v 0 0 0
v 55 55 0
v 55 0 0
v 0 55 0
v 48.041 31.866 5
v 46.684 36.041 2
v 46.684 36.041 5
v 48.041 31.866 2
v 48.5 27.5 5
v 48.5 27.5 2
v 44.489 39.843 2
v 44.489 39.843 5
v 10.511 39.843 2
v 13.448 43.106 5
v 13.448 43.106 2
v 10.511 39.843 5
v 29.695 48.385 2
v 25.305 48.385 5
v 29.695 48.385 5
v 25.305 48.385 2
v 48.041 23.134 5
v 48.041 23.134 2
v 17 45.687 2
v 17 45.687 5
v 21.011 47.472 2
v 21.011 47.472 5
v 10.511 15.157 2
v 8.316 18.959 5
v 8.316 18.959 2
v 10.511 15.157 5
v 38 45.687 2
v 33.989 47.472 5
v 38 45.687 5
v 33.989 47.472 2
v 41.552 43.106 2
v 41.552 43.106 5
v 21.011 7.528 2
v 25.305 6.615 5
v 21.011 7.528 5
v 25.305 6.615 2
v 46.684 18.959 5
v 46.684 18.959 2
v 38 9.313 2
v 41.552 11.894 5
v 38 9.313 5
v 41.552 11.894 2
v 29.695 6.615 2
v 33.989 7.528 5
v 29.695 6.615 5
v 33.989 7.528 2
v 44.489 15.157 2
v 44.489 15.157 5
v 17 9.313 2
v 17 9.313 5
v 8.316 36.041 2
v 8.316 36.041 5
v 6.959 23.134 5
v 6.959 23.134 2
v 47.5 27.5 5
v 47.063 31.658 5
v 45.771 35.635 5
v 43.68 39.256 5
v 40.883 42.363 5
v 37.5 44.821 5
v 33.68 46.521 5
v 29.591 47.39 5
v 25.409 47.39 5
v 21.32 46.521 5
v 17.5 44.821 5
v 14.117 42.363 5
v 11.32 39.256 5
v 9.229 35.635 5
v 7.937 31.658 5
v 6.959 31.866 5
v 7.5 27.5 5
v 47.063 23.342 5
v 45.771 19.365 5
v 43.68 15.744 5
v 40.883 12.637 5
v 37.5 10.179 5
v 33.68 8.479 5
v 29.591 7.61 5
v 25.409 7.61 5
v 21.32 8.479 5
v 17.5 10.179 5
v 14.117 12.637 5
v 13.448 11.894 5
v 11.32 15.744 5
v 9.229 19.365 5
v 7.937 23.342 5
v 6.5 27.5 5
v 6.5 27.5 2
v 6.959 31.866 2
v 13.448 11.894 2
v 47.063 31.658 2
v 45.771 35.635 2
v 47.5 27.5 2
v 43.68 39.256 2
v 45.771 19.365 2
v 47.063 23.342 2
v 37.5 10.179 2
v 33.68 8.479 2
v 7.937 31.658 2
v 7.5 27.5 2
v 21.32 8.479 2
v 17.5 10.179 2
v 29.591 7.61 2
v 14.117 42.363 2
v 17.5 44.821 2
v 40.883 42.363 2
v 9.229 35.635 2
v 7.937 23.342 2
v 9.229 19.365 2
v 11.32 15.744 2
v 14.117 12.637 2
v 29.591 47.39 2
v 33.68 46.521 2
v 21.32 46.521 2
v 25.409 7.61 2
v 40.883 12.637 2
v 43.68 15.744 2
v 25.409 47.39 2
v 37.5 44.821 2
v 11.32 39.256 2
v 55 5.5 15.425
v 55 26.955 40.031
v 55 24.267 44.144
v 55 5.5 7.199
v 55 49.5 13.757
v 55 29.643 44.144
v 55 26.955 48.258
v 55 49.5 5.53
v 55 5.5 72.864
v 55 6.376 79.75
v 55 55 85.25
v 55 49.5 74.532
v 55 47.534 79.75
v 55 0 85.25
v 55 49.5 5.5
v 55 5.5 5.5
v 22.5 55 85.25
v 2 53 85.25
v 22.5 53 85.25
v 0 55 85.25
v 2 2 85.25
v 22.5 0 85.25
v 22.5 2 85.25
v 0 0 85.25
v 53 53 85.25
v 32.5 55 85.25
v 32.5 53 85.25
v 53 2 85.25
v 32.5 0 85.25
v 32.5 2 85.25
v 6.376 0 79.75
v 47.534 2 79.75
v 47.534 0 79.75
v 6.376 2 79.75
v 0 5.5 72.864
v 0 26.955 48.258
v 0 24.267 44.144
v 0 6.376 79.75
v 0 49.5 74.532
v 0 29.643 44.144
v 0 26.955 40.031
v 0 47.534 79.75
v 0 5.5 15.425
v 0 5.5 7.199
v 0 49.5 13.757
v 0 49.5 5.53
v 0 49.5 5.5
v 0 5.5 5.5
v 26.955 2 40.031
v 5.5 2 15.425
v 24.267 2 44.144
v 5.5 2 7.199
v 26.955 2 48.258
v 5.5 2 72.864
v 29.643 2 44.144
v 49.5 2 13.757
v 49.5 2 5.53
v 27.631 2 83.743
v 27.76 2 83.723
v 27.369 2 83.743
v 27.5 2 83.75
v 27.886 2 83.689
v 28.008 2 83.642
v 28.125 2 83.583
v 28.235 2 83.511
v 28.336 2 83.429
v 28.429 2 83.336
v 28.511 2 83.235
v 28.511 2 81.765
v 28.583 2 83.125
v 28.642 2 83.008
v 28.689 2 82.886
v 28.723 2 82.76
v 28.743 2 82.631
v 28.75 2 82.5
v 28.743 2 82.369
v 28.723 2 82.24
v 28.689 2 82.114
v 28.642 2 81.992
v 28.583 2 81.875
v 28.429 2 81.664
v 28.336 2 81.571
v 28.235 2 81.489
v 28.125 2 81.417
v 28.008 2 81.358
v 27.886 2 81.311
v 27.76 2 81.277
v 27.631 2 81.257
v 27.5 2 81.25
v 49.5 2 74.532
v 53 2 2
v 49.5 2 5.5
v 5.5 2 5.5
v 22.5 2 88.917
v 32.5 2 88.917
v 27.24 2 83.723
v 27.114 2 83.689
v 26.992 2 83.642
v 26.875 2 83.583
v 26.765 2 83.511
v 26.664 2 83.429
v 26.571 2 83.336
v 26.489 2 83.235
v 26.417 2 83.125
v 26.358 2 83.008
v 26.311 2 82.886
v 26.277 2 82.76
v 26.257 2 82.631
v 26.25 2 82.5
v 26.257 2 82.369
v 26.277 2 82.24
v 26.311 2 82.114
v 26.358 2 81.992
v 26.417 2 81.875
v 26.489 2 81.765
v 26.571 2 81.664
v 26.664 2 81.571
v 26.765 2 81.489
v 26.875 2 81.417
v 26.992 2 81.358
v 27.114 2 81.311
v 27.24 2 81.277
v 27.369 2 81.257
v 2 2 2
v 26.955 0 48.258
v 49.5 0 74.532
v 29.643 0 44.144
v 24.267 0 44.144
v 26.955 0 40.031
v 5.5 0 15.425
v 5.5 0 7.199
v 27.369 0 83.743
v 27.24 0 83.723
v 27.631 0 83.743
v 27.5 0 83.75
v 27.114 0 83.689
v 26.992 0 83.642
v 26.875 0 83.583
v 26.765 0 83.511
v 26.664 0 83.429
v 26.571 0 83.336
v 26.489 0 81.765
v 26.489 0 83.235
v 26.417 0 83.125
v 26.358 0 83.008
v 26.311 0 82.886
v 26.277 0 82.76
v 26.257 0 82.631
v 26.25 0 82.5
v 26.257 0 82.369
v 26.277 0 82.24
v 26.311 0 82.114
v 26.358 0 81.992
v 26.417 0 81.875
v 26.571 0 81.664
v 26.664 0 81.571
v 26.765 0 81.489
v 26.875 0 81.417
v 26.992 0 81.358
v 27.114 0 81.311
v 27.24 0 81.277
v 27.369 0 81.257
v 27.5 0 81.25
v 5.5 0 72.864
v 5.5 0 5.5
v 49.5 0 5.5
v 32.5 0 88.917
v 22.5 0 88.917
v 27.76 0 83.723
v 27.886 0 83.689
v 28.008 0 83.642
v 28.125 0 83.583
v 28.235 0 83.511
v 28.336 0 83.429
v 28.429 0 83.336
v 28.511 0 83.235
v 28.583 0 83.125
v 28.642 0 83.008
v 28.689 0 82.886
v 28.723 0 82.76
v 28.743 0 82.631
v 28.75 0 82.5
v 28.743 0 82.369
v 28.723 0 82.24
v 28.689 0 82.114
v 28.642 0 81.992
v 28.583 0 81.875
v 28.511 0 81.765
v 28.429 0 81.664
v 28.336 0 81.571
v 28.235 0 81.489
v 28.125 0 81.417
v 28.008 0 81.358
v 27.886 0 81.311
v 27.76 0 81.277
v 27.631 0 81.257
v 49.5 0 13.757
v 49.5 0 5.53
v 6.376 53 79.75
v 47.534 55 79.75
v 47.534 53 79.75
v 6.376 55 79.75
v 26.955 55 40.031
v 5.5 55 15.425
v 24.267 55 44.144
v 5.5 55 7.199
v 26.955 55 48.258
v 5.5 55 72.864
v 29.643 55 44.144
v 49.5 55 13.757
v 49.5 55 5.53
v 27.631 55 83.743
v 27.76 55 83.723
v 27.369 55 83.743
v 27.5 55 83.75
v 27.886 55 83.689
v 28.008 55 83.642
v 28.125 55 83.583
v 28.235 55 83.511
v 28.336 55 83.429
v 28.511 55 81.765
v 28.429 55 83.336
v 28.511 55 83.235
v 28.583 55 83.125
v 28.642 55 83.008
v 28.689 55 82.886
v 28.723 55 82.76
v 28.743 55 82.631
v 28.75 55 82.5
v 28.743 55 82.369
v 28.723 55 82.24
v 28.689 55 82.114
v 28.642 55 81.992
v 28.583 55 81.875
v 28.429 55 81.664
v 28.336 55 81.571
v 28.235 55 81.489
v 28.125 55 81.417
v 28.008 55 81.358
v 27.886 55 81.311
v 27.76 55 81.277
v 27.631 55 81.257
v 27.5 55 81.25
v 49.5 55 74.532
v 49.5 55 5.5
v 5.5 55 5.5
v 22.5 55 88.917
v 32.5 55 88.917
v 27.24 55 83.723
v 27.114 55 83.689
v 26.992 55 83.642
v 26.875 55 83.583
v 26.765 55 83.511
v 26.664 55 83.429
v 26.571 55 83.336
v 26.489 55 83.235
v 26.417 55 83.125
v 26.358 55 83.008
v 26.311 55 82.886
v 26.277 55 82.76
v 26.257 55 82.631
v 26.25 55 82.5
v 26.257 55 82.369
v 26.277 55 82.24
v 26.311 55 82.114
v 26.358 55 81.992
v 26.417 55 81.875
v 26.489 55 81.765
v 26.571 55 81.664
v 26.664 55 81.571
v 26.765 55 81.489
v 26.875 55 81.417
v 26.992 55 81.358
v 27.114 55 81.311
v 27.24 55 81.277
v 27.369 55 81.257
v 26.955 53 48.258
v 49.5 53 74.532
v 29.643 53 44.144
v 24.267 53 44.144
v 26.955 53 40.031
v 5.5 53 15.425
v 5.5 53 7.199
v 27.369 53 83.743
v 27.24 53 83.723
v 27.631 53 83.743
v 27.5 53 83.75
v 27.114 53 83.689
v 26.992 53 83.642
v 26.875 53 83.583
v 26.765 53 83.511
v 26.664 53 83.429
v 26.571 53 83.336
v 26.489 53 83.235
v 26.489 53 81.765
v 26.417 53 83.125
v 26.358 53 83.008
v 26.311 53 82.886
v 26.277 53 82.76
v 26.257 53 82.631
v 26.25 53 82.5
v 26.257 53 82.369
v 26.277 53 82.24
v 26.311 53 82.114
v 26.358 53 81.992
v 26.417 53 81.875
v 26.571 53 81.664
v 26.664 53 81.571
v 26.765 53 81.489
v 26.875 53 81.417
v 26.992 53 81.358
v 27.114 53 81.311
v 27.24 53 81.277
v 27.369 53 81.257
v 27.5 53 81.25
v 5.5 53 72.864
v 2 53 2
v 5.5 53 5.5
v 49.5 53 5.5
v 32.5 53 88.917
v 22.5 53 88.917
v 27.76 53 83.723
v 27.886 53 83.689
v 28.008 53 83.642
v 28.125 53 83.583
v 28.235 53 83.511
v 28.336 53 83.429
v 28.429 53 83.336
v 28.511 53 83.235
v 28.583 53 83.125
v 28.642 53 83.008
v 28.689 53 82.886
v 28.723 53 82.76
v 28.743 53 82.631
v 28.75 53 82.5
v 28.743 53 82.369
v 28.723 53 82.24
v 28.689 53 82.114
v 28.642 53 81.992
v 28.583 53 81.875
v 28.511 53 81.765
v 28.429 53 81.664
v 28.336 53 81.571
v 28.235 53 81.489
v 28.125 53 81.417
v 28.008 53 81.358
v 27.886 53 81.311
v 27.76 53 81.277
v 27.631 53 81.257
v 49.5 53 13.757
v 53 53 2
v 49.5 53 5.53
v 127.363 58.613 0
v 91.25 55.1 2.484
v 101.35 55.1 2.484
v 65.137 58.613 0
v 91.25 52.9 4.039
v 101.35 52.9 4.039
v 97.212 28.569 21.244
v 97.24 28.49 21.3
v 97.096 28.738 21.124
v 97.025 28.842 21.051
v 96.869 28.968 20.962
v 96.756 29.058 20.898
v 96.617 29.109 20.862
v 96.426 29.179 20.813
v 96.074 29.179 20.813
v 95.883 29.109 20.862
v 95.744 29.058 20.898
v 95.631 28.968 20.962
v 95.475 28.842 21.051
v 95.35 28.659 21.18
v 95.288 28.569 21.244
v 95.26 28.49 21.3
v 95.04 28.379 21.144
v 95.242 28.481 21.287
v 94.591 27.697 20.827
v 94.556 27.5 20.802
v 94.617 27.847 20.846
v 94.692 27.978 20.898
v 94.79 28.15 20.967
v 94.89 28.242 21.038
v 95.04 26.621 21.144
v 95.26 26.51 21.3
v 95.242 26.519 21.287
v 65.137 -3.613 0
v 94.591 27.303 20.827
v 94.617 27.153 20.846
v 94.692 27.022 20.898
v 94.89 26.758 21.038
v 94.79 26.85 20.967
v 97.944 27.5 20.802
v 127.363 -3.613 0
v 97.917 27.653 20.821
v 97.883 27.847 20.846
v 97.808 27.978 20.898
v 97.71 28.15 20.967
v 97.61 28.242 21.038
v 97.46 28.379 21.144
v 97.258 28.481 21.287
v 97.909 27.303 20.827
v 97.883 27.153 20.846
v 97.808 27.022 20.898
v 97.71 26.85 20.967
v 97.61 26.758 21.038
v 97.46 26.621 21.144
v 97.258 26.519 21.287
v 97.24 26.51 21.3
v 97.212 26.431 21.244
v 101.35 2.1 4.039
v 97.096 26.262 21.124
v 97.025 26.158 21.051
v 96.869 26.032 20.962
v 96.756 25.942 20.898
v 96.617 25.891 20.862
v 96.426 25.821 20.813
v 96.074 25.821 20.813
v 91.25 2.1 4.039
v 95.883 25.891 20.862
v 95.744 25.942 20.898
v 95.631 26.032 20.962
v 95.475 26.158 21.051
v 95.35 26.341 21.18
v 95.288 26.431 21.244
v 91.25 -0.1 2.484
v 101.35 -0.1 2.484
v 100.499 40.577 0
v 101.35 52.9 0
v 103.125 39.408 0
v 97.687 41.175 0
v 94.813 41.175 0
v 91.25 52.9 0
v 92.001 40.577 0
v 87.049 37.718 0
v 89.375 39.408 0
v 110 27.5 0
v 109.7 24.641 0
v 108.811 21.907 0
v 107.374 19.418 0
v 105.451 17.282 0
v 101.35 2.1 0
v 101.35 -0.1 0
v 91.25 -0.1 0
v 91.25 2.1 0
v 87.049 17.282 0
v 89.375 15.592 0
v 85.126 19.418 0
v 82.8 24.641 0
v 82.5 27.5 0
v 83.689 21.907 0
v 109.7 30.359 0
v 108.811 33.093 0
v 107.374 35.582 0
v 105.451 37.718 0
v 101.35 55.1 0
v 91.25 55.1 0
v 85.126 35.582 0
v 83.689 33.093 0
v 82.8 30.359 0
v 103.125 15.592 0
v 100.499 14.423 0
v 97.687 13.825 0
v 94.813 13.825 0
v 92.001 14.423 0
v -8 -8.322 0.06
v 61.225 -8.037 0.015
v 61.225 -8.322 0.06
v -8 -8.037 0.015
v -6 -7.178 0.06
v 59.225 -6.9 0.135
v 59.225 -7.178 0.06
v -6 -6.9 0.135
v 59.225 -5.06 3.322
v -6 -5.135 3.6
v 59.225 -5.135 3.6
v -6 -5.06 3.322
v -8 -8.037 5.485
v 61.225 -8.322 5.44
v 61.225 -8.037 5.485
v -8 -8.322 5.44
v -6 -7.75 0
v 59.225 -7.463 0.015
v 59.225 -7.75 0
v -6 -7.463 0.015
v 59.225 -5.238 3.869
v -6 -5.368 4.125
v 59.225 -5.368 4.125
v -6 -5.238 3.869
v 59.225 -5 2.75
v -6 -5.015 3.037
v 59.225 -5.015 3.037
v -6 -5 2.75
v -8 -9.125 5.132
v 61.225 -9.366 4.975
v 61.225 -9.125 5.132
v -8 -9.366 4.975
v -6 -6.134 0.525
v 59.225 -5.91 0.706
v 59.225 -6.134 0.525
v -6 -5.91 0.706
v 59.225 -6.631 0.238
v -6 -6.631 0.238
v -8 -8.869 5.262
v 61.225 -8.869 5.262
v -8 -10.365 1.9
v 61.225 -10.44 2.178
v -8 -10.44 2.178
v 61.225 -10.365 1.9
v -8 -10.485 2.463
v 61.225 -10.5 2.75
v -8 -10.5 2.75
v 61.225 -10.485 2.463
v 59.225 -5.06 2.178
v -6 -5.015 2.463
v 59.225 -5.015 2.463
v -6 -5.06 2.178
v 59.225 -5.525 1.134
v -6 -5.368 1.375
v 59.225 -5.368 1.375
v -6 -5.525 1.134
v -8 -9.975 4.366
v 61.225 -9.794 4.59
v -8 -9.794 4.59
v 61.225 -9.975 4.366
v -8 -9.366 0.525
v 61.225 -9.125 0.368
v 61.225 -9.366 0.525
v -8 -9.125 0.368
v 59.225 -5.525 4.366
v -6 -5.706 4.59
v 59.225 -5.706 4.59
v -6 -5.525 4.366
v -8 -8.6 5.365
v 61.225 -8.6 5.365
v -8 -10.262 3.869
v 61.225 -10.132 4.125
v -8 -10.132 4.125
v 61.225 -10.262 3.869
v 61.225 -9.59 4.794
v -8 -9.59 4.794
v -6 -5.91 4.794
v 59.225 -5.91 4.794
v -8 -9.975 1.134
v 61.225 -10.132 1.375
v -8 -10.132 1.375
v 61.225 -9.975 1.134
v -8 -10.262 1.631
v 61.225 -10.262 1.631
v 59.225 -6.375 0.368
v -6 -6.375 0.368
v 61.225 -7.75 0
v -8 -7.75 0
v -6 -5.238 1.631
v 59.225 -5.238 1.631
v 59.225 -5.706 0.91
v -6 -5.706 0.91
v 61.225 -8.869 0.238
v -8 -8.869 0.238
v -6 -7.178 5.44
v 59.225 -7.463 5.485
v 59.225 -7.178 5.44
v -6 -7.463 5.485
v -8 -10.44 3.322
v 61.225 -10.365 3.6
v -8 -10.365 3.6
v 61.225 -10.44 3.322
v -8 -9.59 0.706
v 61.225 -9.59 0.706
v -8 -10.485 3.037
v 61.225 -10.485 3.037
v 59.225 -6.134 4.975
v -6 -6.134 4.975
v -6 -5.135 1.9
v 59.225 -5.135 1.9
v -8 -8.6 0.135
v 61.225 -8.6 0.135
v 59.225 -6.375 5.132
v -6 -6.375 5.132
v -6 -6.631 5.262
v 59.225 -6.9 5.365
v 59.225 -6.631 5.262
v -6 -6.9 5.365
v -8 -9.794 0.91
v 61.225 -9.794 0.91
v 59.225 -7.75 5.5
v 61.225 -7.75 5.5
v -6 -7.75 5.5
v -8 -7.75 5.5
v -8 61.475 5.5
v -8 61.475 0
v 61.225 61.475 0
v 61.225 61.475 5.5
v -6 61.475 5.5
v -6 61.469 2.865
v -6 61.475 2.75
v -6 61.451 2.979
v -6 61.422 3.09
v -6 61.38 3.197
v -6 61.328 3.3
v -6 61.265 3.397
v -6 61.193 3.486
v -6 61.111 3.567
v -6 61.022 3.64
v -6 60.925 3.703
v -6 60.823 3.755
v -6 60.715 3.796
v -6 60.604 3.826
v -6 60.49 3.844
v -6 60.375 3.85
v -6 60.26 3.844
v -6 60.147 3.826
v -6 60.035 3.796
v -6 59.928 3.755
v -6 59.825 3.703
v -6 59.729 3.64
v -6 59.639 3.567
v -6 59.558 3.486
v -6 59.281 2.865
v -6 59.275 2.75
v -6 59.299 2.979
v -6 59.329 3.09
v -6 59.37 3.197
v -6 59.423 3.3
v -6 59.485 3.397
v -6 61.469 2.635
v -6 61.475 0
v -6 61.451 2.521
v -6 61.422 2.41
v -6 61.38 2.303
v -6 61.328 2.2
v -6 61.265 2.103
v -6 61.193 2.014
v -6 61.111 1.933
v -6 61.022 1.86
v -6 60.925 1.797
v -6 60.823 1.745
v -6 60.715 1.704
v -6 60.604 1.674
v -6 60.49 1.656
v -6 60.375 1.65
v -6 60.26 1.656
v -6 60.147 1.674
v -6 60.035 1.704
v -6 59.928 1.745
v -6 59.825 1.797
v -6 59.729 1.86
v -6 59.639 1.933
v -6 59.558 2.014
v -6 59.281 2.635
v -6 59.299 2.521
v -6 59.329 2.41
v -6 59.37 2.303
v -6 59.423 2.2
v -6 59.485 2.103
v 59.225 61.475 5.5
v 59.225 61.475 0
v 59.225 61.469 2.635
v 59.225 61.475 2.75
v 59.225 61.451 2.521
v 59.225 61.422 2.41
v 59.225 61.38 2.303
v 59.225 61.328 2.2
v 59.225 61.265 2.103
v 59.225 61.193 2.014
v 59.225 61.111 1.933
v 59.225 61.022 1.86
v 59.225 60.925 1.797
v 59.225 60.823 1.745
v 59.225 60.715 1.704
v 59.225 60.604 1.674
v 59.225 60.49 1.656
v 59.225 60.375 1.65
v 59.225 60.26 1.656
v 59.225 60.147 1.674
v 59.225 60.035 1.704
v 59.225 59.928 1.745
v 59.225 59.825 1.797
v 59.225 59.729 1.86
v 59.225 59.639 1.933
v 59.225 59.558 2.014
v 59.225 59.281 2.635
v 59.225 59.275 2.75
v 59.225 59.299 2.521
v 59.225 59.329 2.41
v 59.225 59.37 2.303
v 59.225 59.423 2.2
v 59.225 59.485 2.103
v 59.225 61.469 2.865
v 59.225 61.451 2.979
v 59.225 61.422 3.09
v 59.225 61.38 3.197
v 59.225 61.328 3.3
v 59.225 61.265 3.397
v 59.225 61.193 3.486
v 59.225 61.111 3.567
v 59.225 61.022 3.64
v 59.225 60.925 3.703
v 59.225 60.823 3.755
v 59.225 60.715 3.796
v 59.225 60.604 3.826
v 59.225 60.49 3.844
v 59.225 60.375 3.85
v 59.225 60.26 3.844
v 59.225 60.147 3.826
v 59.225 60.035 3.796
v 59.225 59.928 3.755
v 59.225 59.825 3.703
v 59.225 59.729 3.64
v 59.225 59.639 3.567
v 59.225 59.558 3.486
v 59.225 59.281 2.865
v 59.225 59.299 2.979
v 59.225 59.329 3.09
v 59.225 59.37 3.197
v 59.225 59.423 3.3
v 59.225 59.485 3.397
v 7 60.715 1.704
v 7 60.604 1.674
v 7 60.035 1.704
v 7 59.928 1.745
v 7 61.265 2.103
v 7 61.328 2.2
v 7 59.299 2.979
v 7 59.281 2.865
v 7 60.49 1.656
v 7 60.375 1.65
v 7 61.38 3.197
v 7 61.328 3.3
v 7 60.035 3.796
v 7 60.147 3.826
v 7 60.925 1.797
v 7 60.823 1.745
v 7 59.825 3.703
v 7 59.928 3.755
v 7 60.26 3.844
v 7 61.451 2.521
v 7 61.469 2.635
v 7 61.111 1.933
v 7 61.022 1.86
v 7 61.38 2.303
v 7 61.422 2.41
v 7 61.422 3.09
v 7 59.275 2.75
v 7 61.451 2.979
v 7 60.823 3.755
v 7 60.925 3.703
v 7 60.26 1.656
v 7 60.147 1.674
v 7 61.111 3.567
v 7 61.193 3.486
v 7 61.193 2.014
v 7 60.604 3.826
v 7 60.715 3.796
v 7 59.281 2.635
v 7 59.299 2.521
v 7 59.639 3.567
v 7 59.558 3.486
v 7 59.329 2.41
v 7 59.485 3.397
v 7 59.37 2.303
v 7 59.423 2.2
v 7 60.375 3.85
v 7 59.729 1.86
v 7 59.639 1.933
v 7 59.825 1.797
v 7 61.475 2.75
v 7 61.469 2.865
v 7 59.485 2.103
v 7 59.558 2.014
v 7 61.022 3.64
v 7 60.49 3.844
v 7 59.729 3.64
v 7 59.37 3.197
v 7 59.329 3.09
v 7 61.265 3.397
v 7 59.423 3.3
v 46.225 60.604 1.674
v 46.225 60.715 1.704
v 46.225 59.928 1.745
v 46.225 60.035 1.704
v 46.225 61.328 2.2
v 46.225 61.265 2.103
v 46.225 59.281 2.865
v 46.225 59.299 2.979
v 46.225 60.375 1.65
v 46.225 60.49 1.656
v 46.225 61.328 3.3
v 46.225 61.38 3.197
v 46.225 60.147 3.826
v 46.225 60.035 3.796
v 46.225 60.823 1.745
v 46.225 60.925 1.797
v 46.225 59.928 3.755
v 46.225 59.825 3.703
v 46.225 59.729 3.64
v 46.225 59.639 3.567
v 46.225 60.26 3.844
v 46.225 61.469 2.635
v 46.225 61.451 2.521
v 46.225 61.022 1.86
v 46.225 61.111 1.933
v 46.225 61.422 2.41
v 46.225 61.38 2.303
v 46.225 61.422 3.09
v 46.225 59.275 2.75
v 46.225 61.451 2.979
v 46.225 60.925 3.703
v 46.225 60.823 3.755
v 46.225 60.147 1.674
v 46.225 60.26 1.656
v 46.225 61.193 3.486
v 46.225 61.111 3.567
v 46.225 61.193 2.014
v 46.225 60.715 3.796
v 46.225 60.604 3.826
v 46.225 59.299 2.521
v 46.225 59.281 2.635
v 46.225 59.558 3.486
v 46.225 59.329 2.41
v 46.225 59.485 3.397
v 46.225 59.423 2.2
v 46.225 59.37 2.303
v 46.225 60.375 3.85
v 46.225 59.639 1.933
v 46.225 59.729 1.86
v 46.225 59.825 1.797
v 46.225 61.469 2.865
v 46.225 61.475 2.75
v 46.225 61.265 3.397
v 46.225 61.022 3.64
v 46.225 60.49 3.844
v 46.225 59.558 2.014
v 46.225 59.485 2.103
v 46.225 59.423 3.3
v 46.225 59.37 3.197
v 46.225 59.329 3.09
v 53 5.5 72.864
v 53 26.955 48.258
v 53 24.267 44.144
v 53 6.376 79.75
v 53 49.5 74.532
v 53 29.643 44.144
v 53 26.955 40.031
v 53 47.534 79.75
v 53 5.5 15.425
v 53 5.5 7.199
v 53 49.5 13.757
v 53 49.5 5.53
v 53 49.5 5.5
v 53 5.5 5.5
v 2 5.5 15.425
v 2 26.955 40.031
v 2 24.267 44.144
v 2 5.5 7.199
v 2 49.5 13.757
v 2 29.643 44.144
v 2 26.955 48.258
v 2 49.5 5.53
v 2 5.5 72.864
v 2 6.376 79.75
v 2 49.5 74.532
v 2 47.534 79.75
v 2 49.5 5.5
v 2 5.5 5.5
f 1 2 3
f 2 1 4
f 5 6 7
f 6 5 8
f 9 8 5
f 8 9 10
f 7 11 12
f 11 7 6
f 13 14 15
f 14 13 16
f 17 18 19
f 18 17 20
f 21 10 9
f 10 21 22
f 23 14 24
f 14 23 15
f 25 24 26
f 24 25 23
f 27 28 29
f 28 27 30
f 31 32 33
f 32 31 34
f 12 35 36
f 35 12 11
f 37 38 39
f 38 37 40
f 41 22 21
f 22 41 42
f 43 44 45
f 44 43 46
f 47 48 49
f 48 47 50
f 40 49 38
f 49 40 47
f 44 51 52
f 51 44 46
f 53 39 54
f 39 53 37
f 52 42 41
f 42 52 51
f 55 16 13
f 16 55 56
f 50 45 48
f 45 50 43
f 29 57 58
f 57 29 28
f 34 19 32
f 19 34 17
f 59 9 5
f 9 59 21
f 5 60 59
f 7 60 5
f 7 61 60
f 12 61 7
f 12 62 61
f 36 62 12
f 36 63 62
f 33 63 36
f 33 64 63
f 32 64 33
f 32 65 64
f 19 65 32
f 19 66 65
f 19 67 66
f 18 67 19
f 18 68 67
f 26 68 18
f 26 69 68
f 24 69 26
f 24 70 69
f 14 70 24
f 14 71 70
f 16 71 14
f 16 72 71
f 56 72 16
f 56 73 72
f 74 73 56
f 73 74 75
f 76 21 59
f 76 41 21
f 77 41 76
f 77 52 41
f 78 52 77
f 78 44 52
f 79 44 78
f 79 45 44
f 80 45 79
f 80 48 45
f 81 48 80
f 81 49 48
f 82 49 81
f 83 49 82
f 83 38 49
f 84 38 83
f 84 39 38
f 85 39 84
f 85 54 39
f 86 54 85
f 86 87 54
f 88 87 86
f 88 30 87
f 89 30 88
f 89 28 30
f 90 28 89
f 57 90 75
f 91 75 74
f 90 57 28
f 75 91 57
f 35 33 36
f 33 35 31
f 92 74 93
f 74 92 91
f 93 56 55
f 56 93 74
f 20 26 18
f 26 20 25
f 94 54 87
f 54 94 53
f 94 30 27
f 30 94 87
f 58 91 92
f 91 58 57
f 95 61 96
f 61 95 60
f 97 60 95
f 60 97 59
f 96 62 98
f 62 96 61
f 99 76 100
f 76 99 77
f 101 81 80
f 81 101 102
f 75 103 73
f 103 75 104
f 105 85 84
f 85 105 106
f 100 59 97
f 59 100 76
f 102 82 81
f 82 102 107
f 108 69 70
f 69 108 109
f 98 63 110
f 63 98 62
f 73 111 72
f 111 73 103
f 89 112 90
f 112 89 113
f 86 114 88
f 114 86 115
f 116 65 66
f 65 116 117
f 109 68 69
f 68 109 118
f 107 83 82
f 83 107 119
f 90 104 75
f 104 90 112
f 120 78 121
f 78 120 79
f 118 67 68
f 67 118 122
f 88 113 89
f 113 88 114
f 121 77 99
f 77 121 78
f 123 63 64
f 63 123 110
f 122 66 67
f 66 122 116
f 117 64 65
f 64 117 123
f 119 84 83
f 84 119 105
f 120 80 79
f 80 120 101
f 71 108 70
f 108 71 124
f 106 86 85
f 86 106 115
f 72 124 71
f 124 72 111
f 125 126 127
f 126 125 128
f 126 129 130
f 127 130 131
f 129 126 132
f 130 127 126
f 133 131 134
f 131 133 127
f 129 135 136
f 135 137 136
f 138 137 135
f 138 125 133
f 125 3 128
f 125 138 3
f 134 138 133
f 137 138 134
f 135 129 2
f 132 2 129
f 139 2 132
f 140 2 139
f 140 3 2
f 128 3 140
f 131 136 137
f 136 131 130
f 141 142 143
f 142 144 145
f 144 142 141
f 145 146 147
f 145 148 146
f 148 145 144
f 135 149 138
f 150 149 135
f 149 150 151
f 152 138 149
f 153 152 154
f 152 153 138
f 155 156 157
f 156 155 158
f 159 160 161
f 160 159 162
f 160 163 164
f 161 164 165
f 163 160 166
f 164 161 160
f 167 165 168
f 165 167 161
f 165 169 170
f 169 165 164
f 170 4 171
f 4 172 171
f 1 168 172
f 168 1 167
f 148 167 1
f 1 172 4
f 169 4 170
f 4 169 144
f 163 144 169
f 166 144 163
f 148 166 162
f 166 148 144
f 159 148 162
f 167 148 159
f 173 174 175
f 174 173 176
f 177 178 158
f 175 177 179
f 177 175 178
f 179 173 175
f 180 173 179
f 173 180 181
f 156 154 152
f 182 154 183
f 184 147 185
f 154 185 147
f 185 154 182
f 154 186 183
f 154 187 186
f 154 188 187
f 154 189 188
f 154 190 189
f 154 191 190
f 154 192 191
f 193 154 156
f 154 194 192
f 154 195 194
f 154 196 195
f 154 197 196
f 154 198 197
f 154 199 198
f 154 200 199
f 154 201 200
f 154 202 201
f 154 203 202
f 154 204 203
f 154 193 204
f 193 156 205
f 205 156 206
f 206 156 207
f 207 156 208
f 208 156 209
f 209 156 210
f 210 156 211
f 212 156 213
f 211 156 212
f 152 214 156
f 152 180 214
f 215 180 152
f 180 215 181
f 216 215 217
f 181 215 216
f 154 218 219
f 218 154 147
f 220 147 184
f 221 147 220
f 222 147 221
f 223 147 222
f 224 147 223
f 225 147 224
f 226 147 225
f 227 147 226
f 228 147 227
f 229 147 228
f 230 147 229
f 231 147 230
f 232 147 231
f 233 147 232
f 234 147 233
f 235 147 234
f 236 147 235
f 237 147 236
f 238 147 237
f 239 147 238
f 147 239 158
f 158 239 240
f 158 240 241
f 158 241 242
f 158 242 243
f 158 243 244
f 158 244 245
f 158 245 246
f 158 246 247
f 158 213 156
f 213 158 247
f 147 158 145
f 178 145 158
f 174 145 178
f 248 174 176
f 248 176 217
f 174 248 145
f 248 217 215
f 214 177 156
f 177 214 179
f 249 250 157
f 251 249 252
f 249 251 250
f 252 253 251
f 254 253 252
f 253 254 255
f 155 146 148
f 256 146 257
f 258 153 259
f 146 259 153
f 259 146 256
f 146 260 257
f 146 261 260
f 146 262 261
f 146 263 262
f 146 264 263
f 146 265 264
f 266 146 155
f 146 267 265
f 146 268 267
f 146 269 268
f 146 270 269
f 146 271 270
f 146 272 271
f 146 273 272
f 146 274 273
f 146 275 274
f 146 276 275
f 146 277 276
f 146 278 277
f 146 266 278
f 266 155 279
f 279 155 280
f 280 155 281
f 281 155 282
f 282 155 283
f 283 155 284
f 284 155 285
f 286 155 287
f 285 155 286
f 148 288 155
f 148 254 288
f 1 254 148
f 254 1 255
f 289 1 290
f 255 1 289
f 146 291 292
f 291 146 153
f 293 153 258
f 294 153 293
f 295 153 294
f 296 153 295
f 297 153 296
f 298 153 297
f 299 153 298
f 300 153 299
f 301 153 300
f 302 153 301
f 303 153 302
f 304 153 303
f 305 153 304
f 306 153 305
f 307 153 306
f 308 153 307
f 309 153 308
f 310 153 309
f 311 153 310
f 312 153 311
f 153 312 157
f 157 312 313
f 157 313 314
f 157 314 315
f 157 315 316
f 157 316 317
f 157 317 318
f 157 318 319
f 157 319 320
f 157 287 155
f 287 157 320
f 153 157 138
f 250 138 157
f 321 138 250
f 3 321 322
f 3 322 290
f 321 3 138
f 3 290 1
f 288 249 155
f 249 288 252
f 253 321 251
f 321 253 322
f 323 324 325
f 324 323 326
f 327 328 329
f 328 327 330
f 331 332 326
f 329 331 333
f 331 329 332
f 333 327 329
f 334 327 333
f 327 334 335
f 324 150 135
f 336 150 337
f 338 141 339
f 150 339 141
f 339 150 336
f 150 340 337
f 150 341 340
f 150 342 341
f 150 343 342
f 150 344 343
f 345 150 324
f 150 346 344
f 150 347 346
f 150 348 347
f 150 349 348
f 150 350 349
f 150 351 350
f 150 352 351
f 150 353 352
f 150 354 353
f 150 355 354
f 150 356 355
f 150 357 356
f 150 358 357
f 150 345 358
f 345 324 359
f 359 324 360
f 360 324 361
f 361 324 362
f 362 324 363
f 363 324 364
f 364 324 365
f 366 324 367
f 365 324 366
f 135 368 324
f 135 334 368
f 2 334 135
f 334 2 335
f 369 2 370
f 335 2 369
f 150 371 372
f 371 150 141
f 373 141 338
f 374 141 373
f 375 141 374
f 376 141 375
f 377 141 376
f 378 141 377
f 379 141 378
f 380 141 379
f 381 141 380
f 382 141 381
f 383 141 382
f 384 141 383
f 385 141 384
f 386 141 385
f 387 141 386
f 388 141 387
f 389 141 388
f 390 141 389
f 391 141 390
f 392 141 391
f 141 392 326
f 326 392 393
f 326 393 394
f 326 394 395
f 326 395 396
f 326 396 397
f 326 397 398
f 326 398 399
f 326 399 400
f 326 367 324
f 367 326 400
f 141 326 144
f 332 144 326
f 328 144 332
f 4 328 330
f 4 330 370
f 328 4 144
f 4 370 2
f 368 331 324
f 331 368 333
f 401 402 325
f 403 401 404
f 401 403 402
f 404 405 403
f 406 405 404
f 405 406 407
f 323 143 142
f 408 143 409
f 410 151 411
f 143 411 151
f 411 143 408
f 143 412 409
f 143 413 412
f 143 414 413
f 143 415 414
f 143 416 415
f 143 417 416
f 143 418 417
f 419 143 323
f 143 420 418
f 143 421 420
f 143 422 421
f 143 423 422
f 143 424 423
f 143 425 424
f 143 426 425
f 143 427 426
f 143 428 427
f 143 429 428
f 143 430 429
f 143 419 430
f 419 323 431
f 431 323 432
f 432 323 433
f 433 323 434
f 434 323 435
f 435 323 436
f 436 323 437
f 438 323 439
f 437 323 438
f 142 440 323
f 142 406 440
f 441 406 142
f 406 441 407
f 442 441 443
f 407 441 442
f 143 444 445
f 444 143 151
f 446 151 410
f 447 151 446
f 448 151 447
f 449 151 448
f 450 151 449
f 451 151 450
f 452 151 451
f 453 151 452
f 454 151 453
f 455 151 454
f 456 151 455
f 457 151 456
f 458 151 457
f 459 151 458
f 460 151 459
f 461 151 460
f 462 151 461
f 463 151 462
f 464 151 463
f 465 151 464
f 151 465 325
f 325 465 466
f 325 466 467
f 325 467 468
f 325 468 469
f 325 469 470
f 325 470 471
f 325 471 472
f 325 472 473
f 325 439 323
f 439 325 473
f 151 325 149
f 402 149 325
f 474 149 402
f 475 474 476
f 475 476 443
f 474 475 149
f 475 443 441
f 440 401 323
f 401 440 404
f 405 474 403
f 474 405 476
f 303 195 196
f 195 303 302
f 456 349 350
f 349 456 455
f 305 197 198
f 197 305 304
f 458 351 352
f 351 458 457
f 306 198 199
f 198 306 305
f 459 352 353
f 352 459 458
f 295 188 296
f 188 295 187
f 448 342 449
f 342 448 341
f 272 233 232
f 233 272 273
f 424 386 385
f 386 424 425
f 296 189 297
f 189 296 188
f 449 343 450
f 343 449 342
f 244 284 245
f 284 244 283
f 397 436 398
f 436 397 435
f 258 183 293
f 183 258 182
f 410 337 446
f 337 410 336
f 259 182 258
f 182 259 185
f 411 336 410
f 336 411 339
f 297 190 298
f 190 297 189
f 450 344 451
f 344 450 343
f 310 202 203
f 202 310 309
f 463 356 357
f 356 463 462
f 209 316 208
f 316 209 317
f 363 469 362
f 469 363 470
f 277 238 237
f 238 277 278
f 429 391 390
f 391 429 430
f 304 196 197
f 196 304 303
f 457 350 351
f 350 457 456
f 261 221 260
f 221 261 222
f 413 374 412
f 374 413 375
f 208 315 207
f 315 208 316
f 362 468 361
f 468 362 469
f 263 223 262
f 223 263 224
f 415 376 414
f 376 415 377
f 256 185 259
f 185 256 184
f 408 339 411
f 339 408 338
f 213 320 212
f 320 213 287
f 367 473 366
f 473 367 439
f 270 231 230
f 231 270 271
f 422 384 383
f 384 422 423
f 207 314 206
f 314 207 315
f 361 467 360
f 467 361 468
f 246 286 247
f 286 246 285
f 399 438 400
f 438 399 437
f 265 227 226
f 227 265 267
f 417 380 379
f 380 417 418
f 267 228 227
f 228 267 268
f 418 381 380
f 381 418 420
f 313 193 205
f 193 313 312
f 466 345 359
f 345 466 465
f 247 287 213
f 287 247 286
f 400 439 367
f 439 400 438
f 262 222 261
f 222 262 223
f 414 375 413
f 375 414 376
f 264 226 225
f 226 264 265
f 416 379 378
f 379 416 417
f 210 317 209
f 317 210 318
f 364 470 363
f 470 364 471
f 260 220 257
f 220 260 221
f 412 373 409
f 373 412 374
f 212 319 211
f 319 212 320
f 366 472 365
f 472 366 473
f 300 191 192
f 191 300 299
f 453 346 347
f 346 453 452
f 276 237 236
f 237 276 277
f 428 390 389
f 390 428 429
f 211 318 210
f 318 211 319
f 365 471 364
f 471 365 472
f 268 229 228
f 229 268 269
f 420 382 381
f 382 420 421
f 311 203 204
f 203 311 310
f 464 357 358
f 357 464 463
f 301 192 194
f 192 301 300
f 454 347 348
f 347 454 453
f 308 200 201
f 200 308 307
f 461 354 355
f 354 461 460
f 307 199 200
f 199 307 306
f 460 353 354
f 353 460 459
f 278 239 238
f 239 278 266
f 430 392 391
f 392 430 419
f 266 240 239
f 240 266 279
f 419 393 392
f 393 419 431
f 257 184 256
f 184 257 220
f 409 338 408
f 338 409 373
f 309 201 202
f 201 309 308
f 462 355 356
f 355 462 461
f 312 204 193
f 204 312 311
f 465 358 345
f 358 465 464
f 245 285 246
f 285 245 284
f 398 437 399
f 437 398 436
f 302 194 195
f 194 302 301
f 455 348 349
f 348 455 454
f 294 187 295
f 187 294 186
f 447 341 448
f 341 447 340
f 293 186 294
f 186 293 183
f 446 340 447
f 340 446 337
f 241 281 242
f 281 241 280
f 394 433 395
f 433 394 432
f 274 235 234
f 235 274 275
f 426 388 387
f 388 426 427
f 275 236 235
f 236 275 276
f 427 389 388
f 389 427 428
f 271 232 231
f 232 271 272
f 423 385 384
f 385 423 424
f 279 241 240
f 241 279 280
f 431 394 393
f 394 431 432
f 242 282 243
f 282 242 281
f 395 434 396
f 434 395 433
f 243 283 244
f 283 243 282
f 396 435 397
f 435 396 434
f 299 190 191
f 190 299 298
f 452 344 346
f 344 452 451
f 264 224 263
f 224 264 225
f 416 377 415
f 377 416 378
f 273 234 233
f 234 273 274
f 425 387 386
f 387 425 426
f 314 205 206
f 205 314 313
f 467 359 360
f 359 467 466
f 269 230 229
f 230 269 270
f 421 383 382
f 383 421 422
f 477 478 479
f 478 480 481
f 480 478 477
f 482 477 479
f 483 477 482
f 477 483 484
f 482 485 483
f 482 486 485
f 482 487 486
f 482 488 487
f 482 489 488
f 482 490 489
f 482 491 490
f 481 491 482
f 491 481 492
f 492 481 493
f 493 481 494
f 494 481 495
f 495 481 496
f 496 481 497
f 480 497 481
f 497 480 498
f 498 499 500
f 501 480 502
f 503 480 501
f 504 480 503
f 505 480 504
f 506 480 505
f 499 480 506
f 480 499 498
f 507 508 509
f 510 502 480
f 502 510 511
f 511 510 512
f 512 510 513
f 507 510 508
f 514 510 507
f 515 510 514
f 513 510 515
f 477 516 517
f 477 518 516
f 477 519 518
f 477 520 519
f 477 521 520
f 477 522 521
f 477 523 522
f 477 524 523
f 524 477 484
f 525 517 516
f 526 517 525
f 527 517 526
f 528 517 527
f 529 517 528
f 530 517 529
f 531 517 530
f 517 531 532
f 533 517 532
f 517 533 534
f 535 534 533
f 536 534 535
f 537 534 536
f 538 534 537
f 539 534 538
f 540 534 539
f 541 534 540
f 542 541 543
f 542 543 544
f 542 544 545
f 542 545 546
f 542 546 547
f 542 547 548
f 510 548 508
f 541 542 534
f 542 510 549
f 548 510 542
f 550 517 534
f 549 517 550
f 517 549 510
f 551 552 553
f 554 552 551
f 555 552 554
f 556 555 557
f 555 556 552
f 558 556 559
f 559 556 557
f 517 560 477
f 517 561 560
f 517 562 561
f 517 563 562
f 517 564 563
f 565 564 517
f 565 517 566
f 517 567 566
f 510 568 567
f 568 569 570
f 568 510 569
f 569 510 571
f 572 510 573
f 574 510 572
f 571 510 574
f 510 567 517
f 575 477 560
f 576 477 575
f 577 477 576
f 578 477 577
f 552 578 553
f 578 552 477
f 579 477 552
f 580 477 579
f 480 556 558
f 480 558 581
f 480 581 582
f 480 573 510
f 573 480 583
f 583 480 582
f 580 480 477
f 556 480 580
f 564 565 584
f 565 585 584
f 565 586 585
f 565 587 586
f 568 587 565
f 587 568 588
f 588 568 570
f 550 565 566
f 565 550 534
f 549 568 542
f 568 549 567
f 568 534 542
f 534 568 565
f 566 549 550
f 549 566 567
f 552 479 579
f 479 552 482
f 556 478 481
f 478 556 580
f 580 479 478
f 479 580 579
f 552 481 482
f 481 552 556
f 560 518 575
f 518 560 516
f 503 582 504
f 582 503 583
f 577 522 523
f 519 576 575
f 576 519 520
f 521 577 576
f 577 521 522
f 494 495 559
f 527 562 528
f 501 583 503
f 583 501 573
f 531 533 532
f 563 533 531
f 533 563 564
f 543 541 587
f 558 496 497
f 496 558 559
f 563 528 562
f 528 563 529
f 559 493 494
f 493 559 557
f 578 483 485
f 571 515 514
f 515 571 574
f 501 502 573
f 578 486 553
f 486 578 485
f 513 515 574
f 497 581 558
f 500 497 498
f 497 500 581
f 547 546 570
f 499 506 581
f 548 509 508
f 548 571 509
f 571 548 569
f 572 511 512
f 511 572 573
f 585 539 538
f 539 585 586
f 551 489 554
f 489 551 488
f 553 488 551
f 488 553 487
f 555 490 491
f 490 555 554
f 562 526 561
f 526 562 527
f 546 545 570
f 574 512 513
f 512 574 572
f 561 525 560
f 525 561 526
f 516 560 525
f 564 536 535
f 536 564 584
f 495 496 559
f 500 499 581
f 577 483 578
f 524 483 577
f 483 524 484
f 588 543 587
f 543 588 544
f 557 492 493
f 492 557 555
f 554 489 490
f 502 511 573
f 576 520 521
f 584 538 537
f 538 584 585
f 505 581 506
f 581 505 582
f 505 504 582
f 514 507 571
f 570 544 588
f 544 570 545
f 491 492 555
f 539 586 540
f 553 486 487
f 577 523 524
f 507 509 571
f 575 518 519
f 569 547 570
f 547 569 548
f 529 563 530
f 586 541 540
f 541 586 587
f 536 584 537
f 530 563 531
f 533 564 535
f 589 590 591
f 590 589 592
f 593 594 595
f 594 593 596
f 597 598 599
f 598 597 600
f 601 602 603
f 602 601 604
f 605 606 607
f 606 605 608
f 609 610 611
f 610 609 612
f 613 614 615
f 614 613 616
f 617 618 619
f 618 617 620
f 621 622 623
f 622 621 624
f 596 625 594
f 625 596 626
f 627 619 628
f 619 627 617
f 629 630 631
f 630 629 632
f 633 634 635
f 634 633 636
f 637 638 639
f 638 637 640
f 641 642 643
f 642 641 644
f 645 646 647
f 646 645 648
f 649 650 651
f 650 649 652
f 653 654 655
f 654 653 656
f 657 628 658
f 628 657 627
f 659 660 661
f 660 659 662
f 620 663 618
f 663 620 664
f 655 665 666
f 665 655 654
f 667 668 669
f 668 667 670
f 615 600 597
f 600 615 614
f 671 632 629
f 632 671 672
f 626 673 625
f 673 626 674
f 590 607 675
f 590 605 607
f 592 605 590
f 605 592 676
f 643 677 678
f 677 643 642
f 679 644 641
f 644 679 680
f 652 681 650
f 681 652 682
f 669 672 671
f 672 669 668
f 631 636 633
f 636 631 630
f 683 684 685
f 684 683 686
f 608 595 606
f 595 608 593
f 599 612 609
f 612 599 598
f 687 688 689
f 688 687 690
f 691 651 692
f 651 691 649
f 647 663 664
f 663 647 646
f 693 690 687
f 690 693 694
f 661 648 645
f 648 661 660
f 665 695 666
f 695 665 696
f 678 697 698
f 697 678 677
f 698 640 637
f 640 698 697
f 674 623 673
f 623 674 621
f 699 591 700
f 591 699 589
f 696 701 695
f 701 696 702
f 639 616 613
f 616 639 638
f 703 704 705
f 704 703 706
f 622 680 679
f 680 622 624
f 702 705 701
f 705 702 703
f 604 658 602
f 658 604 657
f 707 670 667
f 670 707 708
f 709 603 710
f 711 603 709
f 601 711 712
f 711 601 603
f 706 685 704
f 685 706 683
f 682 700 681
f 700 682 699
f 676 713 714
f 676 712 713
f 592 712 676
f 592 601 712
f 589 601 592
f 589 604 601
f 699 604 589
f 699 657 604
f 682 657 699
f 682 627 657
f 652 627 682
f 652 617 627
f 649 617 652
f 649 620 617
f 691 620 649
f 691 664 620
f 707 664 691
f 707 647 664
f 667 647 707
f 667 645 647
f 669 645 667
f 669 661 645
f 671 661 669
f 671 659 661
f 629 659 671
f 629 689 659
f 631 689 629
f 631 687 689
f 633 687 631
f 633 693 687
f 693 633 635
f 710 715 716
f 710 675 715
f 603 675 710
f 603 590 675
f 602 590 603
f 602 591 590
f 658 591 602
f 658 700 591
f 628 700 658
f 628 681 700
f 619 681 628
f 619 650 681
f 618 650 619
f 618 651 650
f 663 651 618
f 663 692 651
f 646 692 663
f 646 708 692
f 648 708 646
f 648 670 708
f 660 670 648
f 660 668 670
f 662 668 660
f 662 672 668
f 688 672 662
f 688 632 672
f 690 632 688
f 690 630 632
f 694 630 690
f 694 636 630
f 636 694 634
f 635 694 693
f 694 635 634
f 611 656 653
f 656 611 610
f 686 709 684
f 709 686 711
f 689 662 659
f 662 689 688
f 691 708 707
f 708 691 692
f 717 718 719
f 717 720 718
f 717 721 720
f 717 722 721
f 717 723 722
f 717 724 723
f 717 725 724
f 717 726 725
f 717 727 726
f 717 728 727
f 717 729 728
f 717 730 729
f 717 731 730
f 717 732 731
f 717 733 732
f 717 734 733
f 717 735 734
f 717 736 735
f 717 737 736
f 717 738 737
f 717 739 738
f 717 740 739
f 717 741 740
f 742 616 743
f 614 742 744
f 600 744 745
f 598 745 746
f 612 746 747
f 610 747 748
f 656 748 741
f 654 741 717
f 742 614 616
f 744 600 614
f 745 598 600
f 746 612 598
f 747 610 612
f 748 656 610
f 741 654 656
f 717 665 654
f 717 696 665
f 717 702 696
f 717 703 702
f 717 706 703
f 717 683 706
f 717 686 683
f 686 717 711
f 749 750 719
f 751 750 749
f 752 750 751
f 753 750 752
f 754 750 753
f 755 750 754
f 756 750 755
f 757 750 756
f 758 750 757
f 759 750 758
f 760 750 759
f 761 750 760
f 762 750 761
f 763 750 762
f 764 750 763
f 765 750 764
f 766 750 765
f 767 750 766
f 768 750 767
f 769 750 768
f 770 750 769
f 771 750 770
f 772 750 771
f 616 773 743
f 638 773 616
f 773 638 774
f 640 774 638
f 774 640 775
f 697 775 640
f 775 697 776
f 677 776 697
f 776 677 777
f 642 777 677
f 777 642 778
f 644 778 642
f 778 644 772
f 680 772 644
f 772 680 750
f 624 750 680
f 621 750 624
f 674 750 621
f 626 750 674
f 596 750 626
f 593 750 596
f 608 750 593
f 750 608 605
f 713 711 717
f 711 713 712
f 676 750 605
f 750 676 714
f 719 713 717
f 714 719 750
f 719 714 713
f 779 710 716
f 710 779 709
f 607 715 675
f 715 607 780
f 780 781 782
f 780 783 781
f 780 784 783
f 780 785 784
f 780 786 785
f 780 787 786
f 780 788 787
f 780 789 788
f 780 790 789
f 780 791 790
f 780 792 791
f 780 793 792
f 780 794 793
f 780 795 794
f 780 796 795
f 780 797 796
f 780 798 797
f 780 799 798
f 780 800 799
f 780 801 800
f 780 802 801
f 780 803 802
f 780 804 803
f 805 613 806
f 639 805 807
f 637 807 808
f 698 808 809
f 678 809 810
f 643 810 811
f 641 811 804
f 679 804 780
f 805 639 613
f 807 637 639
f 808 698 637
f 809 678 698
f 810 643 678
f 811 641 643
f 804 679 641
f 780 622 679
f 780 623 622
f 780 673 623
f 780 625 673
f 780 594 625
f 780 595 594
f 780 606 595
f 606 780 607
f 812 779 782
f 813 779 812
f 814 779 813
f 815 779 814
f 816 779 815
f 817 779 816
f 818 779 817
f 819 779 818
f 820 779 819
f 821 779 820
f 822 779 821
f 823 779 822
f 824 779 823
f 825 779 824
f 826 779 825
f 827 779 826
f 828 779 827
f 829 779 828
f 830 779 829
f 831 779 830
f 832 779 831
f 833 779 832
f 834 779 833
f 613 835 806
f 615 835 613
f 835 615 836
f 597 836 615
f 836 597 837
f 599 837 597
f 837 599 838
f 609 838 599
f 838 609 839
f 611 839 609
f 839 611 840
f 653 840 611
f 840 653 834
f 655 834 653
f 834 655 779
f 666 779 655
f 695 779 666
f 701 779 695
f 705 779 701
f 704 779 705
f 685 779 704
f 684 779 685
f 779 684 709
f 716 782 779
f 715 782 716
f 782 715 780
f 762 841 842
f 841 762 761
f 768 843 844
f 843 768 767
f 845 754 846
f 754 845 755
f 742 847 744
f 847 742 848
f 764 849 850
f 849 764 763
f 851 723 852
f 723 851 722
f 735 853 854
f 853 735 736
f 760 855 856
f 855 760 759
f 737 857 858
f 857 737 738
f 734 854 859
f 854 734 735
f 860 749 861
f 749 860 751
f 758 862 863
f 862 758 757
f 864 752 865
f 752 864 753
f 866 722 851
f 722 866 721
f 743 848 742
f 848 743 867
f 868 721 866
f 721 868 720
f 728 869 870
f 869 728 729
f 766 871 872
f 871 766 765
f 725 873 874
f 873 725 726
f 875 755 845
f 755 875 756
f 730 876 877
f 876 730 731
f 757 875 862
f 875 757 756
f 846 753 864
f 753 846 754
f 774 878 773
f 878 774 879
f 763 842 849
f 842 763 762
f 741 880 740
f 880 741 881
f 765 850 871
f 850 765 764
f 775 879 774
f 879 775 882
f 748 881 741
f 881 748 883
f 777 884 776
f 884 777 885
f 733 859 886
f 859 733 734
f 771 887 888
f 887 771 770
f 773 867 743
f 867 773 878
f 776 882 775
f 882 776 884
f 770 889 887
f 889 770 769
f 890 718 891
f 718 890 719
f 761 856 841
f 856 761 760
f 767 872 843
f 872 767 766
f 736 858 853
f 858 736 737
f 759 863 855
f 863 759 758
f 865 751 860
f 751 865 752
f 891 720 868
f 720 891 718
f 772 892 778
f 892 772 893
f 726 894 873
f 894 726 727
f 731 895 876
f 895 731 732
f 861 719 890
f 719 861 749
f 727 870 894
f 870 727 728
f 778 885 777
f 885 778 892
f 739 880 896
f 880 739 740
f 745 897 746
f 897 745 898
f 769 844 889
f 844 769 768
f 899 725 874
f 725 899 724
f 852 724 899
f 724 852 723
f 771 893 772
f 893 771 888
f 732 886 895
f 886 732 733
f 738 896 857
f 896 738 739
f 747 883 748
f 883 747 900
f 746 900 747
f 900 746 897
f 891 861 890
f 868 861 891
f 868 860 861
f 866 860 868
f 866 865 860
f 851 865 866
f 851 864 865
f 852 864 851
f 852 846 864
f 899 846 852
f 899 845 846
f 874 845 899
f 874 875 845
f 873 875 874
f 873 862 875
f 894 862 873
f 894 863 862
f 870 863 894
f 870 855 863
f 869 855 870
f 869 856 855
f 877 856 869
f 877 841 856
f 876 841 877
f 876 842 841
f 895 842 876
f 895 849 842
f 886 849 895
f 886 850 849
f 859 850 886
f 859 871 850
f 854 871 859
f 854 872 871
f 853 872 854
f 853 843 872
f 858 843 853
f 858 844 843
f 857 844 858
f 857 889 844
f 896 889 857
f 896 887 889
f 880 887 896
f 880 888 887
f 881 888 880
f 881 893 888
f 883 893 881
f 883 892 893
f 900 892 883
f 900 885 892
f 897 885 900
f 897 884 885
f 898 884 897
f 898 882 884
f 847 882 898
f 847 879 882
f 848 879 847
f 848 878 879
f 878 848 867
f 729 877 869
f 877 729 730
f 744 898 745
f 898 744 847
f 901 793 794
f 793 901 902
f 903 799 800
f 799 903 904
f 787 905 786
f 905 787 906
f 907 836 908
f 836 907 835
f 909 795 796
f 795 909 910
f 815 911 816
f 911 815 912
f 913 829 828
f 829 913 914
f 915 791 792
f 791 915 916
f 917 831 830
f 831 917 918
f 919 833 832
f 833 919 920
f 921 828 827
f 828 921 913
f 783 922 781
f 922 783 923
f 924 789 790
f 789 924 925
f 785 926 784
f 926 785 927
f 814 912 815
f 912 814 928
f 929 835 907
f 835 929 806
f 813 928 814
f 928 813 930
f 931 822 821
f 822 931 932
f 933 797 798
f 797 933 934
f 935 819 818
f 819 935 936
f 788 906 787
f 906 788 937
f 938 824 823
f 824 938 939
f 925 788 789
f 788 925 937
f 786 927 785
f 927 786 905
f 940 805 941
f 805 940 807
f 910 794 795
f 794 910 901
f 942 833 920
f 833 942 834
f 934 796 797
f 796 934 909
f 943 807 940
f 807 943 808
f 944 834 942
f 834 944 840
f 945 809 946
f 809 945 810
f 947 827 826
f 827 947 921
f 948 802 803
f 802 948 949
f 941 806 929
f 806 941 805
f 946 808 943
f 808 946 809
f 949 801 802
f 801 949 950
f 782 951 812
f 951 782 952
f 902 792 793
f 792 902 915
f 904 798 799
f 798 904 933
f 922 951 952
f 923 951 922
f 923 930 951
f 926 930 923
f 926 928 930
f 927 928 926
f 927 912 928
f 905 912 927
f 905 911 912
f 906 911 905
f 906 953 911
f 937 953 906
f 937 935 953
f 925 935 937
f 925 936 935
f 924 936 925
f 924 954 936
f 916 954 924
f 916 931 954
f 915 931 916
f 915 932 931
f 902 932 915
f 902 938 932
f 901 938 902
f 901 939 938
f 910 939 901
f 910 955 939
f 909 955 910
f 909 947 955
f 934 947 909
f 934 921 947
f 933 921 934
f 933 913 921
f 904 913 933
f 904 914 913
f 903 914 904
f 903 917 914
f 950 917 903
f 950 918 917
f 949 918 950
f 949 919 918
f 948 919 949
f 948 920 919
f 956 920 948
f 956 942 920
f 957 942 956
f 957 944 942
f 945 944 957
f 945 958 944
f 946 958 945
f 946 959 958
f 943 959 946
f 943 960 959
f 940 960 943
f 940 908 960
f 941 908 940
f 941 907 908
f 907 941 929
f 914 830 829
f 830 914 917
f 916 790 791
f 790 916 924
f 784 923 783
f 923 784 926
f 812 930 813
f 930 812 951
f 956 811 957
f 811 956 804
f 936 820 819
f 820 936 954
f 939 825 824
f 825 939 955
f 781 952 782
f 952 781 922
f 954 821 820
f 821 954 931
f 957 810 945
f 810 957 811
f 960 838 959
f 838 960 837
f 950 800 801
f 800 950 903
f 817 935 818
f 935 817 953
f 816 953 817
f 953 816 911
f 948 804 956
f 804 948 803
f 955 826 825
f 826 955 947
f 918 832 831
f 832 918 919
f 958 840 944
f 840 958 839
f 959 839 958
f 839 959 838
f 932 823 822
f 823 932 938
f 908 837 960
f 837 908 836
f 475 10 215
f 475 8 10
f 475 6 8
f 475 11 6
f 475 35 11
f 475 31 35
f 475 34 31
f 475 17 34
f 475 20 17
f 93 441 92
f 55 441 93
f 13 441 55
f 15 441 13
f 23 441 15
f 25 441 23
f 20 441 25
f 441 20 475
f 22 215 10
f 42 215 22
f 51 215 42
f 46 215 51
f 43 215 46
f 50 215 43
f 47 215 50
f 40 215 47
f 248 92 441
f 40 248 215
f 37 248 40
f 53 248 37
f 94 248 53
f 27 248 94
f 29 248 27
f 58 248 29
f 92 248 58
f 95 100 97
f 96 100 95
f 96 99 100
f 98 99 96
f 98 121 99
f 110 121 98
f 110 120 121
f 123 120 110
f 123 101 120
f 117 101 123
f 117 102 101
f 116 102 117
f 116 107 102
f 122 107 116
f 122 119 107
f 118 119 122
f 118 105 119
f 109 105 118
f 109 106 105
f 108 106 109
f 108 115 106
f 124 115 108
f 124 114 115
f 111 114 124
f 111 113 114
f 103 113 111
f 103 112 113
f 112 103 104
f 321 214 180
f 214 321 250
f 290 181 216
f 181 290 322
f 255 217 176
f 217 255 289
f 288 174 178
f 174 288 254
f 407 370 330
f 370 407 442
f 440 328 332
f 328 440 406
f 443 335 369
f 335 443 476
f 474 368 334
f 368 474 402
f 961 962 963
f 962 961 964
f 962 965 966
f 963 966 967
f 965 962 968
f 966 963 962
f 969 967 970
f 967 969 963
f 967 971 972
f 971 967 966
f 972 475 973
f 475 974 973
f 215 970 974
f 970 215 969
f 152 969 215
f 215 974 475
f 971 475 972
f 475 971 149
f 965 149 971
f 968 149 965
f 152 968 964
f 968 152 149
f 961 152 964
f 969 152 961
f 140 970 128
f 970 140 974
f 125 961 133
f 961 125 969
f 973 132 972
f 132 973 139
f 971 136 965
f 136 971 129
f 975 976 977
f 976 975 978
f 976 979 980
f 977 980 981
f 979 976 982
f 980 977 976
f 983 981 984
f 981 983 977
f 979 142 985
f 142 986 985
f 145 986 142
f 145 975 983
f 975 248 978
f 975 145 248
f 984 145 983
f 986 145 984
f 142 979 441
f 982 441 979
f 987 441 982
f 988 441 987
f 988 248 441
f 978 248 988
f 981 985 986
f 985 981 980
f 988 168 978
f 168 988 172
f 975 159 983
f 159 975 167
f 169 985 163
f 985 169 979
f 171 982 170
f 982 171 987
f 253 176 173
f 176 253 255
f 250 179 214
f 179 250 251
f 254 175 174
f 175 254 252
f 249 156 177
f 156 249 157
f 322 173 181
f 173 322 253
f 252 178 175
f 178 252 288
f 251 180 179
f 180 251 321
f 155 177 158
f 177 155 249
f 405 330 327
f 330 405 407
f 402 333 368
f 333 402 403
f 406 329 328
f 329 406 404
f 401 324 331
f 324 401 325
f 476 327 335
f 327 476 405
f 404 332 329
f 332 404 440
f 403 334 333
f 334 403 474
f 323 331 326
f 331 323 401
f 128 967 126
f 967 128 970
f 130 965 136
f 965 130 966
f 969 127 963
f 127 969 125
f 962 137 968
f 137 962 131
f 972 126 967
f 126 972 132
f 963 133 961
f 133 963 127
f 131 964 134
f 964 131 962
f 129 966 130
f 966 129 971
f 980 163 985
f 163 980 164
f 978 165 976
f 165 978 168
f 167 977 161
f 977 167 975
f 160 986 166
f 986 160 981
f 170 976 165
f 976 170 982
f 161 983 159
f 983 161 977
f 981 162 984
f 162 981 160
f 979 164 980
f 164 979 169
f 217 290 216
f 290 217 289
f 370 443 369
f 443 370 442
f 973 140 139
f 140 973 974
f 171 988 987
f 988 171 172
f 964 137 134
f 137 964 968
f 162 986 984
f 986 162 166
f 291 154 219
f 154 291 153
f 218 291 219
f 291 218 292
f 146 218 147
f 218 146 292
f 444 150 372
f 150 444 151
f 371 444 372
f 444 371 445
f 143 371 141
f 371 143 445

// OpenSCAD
// Customizable Halloween Lantern
// Author Mathias Dietz
// http://3dprintapps.de


//width and length
wid=55; // [45:180]
//height:width factor
h_factor=1.55; // [1.3:0.1:3]
h=wid*h_factor;

//wall width
wallwidth=10; // [13:thin,10:medium,7:thick]
wall=wid/wallwidth; //[5:20]
cross=wall-1;  // [5:20]

//wall thickness
th=2; //[2:0.5:5]

//Handle
handle=1; //[1:yes,0:no]

echo("High:",h);
echo("Wall:",wall);

cube([wid,wid,th]);
difference(){
 translate([wid/2,wid/2,0]) cylinder(r=21,h=th+3);
 translate([wid/2,wid/2,th/2]) cylinder(r=20,h=th+3);
}

//corners
translate([wid-wall,0,0]) cube([wall,th,h]);
translate([0,0,0]) cube([wall,th,h]);
translate([0,wid-th,0]) cube([wall,th,h]);
translate([wid-wall,wid-th,0]) cube([wall,th,h]);

translate([wid-th,0,0]) cube([th,wall,h]);
translate([wid-th,wid-wall,0]) cube([th,wall,h]);
//door
translate([0,0,0]) cube([th,wall,h]);
translate([0,wid-wall,0]) cube([th,wall,h]);


//cross
ch=sqrt((wid-wall)*(wid-wall) + (h-wall-th-th)*(h-wall-th-th)); 
ab=(h-wall-th-th)/(ch);
cangle=90-asin(ab);
off=wall*sin(cangle);
echo("Angle:",cangle);
translate([0,0,off+th*2]) rotate([0,cangle,0])  cube([cross,th,ch]);
translate([wid-cross,0,th*2]) rotate([0,-cangle,0])  cube([cross,th,ch]);

translate([0,wid-th,th*2+off]) rotate([0,cangle,0])  cube([cross,th,ch]);
translate([wid-cross,wid-th,th*2]) rotate([0,-cangle,0])  cube([cross,th,ch]);

translate([wid-th,0,th*2+off]) rotate([-cangle,0,0])  cube([th,cross,ch]);
translate([wid-th,wid-cross,th*2]) rotate([cangle,0,0])  cube([th,cross,ch]);

translate([0,0,th*2+off]) rotate([-cangle,0,0])  cube([th,cross,ch]);
translate([0,wid-cross,th*2]) rotate([cangle,0,0])  cube([th,cross,ch]);

//quer bottom
translate([0,0,0]) cube([wid,th,wall]);
translate([0,wid-th,0]) cube([wid,th,wall]);
translate([wid-th,0,0]) cube([th,wid,wall]);
translate([0,0,0]) cube([th,wid,wall]); //door
//quer oben
rl=wall/5;
difference(){
    union(){
translate([0,0,h-wall]) cube([wid,th,wall]);
translate([0,wid-th,h-wall]) cube([wid,th,wall]);
    }
    translate([wid/2,wid+1,h-wall/2]) rotate([90,0,0]) cylinder(r=rl+0.15,h=wid+3,$fn=60);
}



translate([wid-th,0,h-wall]) cube([th,wid,wall]);
translate([0,0,h-wall]) cube([th,wid,wall]);

//roof sticks
mh=wid/15;
translate([wid/2-5,0,h]) cube([10,th,mh]);
translate([wid/2-5,wid-th,h]) cube([10,th,mh]);


 
 //root
translate([wid*1.25,0,-h]) difference(){
 translate([wid/2,wid/2,h])  rotate([0,0,45]) cylinder(h=wid/2.5,r1=wid/1.25,r2=00,$fn=4);
translate([wid/2-5,0-0.1,h]) cube([10.1,th+0.2,mh+5]);
translate([wid/2-5,wid-th-0.1,h]) cube([10.1,th+0.2,mh+5]);
    #translate([wid/2,wid/2,h]) cylinder(r1=wid/4,r2=th/2,h=wid/2.5);
}


//Griff
if ( handle == 1){
rd=wall/2;
br=(wid/1.25*2) * sin(45)+7;
echo(br);
translate([-8,-5-rd,0]) union(){
translate([0,0,rd])  rotate([0,90,0]) cylinder(r=rd,h=br,$fn=60);
  cube([th,br,rd*2]);
translate([br-th,0,0]) cube([th,br,rd*2]);

translate([0,br-rl,rd])  rotate([0,90,0]) cylinder(r=rl,h=15,$fn=60);
translate([br-15,br-rl,rd])  rotate([0,90,0]) cylinder(r=rl,h=15,$fn=60);
}
}
